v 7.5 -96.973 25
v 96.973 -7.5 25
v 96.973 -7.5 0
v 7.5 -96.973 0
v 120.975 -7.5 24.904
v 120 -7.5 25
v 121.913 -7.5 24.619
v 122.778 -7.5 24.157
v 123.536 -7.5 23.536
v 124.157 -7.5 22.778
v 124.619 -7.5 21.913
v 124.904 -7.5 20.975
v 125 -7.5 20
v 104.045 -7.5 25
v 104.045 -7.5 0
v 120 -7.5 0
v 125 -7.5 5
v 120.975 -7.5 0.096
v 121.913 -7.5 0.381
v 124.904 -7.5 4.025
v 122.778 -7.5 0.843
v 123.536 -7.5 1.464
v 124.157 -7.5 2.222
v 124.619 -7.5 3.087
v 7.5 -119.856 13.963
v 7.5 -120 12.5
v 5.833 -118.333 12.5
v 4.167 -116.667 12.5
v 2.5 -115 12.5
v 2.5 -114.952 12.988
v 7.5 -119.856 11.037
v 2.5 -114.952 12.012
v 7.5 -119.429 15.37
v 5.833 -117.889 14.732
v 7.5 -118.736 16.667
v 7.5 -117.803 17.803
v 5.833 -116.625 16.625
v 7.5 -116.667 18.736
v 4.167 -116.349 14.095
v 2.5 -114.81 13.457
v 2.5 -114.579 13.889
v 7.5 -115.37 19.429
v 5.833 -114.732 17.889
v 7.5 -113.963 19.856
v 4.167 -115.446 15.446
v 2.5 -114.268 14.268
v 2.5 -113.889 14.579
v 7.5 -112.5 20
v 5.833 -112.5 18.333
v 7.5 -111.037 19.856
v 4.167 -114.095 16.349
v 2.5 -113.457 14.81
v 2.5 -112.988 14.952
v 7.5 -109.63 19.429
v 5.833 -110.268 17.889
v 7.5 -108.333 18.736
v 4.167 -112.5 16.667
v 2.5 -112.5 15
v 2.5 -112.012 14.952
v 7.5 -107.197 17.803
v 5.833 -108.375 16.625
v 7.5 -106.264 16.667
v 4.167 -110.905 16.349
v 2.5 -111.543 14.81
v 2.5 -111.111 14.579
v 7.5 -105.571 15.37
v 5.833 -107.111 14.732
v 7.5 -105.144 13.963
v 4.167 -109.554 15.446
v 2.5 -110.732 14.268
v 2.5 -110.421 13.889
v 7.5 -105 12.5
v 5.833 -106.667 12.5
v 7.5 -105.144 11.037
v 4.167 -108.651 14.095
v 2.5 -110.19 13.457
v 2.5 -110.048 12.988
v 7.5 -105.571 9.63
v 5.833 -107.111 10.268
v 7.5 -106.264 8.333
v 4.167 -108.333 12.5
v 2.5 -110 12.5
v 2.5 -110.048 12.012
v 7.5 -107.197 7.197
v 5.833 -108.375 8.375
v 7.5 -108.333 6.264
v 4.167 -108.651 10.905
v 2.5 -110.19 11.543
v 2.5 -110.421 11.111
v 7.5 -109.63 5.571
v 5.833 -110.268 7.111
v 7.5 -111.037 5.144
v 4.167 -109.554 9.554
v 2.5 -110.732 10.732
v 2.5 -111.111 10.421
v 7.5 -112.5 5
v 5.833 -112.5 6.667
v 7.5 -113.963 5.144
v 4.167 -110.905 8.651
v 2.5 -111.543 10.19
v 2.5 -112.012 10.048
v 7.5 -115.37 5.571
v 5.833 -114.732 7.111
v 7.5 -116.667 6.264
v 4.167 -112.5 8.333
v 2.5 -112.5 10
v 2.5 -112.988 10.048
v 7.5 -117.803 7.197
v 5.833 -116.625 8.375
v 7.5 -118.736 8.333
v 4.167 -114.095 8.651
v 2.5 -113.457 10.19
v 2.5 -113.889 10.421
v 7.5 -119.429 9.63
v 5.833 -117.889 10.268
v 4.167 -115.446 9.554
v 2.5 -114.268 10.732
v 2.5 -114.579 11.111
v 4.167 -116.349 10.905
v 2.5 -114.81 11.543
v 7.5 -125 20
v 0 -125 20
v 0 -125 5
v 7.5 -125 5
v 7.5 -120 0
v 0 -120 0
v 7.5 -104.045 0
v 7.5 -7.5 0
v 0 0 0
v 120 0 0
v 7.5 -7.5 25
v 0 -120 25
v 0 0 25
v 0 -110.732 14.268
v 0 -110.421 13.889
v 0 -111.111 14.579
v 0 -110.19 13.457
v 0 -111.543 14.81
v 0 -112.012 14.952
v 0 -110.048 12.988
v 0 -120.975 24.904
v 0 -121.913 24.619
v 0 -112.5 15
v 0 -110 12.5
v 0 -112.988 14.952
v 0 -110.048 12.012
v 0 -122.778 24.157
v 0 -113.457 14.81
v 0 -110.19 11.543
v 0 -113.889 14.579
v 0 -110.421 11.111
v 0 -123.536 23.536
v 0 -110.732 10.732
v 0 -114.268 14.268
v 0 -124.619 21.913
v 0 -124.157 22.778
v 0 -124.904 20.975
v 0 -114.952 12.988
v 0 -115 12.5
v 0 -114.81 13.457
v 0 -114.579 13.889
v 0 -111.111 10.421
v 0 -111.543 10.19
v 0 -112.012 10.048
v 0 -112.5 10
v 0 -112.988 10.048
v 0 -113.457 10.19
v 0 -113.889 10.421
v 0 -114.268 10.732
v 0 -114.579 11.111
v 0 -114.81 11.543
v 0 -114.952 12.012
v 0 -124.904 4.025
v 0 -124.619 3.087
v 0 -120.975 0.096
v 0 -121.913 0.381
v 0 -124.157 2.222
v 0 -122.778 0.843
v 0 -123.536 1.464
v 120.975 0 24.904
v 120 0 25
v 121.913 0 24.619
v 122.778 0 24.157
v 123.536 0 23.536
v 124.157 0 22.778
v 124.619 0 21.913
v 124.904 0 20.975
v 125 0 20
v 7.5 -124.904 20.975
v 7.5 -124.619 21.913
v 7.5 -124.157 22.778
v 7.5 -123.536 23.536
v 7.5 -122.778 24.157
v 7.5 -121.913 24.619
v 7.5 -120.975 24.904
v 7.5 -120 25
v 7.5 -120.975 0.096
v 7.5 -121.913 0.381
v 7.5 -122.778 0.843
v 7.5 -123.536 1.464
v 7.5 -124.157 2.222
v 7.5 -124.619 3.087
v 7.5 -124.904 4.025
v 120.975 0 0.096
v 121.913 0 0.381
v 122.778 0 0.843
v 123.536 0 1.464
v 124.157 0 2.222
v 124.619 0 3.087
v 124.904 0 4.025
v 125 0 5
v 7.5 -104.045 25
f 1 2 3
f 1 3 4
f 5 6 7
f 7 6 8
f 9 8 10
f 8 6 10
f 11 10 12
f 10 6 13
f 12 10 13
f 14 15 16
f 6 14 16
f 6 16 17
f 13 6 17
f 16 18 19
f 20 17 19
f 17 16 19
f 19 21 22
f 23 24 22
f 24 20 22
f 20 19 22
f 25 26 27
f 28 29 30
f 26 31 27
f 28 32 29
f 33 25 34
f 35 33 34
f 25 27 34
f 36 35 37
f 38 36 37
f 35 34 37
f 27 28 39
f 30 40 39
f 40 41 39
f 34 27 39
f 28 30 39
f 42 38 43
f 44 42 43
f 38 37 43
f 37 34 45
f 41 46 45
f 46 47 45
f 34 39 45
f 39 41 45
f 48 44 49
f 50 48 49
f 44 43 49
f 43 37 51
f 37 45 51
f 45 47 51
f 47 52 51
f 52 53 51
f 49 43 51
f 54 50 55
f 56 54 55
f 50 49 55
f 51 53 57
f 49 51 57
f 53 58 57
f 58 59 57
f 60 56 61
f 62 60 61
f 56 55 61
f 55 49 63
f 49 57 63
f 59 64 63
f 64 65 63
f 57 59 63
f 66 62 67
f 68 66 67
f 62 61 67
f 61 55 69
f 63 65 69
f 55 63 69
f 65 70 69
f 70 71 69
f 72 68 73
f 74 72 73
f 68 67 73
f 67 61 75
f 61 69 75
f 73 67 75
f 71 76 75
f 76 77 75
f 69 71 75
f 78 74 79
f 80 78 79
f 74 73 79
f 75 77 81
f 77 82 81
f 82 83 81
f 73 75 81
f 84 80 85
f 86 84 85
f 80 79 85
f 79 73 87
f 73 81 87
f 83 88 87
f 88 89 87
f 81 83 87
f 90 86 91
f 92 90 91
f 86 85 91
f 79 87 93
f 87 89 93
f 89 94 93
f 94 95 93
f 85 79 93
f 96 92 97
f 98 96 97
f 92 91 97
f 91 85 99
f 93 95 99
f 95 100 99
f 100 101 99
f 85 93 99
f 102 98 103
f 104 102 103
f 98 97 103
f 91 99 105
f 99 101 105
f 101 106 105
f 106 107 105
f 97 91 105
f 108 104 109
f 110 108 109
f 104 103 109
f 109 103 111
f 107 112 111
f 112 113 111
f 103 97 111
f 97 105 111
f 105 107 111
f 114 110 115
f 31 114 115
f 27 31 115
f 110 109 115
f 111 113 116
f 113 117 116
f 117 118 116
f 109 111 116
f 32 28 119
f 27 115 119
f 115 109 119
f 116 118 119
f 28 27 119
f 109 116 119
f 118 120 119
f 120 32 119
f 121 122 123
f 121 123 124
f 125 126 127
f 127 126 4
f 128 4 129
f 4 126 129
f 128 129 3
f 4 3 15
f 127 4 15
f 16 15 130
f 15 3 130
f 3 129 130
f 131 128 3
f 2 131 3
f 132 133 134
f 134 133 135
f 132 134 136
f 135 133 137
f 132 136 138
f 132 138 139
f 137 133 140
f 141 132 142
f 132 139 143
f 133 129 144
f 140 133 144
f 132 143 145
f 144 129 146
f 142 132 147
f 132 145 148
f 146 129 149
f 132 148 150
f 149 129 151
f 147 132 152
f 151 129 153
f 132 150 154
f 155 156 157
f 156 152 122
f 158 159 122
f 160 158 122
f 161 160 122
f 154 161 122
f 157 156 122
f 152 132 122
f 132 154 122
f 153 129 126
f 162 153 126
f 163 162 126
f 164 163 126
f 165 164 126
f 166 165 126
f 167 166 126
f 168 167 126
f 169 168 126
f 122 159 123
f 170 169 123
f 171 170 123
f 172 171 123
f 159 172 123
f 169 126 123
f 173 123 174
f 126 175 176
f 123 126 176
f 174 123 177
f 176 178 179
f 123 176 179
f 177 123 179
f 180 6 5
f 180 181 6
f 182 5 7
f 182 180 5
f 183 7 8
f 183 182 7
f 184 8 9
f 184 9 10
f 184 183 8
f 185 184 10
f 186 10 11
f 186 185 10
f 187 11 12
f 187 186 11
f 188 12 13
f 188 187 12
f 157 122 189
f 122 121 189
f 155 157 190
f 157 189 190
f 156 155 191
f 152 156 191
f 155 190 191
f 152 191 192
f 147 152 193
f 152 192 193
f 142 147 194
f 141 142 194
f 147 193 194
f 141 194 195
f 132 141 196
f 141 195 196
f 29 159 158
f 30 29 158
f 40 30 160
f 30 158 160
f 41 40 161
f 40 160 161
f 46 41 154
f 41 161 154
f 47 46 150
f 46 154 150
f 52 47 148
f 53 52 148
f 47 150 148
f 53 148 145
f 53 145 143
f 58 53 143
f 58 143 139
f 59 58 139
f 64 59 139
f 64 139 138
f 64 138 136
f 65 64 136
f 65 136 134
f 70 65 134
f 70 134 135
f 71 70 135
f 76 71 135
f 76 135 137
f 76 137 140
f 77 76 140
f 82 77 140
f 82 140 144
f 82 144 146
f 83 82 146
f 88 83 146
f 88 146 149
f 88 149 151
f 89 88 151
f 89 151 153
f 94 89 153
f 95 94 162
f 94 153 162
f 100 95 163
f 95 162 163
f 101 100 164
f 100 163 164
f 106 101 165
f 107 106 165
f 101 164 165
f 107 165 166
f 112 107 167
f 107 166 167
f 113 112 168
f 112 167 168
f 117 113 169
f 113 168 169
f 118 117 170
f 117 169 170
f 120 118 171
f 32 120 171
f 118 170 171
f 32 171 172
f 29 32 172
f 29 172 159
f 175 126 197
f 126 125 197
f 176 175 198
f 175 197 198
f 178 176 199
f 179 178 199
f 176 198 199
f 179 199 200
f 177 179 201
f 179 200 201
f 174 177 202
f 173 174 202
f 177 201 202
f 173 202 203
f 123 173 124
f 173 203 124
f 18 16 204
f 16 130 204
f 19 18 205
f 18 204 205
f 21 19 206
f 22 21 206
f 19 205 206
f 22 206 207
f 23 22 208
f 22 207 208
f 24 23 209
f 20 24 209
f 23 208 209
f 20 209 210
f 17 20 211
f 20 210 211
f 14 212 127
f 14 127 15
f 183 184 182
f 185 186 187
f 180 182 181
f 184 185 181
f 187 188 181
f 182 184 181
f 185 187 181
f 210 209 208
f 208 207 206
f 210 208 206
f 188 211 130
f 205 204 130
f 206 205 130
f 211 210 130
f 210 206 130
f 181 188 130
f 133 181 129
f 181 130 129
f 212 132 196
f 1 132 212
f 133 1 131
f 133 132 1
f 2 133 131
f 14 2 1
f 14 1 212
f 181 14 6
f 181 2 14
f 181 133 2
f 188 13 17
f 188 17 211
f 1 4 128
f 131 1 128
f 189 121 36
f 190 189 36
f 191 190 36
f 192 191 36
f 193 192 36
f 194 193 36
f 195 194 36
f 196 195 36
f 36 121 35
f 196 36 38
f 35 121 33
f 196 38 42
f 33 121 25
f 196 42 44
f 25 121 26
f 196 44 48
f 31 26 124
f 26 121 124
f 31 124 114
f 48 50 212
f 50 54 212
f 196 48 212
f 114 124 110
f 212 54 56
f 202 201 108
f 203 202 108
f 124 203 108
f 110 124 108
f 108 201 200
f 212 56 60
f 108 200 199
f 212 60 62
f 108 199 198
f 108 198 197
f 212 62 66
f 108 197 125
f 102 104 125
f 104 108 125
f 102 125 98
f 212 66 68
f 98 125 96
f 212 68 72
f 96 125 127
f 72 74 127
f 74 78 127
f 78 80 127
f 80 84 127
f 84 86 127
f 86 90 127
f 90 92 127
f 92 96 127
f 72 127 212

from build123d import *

# Parameters (mm, degrees)
F0_W     = 117.5
F0_H     = 7.5
F0_W_2   = 7.5
F0_H_2   = 117.5
F1_DEPTH = 25
F3_DEPTH = 25
F4_R     = 2.5
F5_DEPTH = 25
F6_SIZE  = 5
F7_R     = 5


with BuildPart() as f1:
    # F0 (on Top) → F1 (new body)
    with BuildSketch(Plane.XY):
        with Locations((66.25, -3.75)):
            Rectangle(F0_W, F0_H)
        with Locations((3.75, -3.75)):
            Rectangle(F0_W_2, F0_H)
        with Locations((3.75, -66.25)):
            Rectangle(F0_W_2, F0_H_2)
    extrude(amount=F1_DEPTH)

    # F2 (on face) → F3 (join)
    with BuildSketch(Plane.XY.offset(25)):
        Polygon((96.9734936953, -7.5), (7.5, -96.9734936953), (7.5, -104.0445615071), (11.0355339059, -100.5090276012), (100.5090276012, -11.0355339059), (104.0445615071, -7.5), align=None)
    extrude(amount=-F3_DEPTH)

    # F4 (on face) → F5 (cut)
    with BuildSketch(Plane(origin=(0, 0, 0), x_dir=(0, -1, 0), z_dir=(-1, 0, 0))):
        with Locations((112.5, 12.5)):
            Circle(F4_R)
    extrude(amount=-F5_DEPTH, mode=Mode.SUBTRACT)

    # F6
    f6_edges = [f1.edges().sort_by_distance(p)[0] for p in [
        (7.5, -110, 12.5),
    ]]
    chamfer(f6_edges, length=F6_SIZE)

    # F7
    f7_edges = [f1.edges().sort_by_distance(p)[0] for p in [
        (3.75, -125, 25),
        (3.75, -125, 0),
        (125, -3.75, 25),
        (125, -3.75, 0),
    ]]
    fillet(f7_edges, radius=F7_R)


solid = f1.part
